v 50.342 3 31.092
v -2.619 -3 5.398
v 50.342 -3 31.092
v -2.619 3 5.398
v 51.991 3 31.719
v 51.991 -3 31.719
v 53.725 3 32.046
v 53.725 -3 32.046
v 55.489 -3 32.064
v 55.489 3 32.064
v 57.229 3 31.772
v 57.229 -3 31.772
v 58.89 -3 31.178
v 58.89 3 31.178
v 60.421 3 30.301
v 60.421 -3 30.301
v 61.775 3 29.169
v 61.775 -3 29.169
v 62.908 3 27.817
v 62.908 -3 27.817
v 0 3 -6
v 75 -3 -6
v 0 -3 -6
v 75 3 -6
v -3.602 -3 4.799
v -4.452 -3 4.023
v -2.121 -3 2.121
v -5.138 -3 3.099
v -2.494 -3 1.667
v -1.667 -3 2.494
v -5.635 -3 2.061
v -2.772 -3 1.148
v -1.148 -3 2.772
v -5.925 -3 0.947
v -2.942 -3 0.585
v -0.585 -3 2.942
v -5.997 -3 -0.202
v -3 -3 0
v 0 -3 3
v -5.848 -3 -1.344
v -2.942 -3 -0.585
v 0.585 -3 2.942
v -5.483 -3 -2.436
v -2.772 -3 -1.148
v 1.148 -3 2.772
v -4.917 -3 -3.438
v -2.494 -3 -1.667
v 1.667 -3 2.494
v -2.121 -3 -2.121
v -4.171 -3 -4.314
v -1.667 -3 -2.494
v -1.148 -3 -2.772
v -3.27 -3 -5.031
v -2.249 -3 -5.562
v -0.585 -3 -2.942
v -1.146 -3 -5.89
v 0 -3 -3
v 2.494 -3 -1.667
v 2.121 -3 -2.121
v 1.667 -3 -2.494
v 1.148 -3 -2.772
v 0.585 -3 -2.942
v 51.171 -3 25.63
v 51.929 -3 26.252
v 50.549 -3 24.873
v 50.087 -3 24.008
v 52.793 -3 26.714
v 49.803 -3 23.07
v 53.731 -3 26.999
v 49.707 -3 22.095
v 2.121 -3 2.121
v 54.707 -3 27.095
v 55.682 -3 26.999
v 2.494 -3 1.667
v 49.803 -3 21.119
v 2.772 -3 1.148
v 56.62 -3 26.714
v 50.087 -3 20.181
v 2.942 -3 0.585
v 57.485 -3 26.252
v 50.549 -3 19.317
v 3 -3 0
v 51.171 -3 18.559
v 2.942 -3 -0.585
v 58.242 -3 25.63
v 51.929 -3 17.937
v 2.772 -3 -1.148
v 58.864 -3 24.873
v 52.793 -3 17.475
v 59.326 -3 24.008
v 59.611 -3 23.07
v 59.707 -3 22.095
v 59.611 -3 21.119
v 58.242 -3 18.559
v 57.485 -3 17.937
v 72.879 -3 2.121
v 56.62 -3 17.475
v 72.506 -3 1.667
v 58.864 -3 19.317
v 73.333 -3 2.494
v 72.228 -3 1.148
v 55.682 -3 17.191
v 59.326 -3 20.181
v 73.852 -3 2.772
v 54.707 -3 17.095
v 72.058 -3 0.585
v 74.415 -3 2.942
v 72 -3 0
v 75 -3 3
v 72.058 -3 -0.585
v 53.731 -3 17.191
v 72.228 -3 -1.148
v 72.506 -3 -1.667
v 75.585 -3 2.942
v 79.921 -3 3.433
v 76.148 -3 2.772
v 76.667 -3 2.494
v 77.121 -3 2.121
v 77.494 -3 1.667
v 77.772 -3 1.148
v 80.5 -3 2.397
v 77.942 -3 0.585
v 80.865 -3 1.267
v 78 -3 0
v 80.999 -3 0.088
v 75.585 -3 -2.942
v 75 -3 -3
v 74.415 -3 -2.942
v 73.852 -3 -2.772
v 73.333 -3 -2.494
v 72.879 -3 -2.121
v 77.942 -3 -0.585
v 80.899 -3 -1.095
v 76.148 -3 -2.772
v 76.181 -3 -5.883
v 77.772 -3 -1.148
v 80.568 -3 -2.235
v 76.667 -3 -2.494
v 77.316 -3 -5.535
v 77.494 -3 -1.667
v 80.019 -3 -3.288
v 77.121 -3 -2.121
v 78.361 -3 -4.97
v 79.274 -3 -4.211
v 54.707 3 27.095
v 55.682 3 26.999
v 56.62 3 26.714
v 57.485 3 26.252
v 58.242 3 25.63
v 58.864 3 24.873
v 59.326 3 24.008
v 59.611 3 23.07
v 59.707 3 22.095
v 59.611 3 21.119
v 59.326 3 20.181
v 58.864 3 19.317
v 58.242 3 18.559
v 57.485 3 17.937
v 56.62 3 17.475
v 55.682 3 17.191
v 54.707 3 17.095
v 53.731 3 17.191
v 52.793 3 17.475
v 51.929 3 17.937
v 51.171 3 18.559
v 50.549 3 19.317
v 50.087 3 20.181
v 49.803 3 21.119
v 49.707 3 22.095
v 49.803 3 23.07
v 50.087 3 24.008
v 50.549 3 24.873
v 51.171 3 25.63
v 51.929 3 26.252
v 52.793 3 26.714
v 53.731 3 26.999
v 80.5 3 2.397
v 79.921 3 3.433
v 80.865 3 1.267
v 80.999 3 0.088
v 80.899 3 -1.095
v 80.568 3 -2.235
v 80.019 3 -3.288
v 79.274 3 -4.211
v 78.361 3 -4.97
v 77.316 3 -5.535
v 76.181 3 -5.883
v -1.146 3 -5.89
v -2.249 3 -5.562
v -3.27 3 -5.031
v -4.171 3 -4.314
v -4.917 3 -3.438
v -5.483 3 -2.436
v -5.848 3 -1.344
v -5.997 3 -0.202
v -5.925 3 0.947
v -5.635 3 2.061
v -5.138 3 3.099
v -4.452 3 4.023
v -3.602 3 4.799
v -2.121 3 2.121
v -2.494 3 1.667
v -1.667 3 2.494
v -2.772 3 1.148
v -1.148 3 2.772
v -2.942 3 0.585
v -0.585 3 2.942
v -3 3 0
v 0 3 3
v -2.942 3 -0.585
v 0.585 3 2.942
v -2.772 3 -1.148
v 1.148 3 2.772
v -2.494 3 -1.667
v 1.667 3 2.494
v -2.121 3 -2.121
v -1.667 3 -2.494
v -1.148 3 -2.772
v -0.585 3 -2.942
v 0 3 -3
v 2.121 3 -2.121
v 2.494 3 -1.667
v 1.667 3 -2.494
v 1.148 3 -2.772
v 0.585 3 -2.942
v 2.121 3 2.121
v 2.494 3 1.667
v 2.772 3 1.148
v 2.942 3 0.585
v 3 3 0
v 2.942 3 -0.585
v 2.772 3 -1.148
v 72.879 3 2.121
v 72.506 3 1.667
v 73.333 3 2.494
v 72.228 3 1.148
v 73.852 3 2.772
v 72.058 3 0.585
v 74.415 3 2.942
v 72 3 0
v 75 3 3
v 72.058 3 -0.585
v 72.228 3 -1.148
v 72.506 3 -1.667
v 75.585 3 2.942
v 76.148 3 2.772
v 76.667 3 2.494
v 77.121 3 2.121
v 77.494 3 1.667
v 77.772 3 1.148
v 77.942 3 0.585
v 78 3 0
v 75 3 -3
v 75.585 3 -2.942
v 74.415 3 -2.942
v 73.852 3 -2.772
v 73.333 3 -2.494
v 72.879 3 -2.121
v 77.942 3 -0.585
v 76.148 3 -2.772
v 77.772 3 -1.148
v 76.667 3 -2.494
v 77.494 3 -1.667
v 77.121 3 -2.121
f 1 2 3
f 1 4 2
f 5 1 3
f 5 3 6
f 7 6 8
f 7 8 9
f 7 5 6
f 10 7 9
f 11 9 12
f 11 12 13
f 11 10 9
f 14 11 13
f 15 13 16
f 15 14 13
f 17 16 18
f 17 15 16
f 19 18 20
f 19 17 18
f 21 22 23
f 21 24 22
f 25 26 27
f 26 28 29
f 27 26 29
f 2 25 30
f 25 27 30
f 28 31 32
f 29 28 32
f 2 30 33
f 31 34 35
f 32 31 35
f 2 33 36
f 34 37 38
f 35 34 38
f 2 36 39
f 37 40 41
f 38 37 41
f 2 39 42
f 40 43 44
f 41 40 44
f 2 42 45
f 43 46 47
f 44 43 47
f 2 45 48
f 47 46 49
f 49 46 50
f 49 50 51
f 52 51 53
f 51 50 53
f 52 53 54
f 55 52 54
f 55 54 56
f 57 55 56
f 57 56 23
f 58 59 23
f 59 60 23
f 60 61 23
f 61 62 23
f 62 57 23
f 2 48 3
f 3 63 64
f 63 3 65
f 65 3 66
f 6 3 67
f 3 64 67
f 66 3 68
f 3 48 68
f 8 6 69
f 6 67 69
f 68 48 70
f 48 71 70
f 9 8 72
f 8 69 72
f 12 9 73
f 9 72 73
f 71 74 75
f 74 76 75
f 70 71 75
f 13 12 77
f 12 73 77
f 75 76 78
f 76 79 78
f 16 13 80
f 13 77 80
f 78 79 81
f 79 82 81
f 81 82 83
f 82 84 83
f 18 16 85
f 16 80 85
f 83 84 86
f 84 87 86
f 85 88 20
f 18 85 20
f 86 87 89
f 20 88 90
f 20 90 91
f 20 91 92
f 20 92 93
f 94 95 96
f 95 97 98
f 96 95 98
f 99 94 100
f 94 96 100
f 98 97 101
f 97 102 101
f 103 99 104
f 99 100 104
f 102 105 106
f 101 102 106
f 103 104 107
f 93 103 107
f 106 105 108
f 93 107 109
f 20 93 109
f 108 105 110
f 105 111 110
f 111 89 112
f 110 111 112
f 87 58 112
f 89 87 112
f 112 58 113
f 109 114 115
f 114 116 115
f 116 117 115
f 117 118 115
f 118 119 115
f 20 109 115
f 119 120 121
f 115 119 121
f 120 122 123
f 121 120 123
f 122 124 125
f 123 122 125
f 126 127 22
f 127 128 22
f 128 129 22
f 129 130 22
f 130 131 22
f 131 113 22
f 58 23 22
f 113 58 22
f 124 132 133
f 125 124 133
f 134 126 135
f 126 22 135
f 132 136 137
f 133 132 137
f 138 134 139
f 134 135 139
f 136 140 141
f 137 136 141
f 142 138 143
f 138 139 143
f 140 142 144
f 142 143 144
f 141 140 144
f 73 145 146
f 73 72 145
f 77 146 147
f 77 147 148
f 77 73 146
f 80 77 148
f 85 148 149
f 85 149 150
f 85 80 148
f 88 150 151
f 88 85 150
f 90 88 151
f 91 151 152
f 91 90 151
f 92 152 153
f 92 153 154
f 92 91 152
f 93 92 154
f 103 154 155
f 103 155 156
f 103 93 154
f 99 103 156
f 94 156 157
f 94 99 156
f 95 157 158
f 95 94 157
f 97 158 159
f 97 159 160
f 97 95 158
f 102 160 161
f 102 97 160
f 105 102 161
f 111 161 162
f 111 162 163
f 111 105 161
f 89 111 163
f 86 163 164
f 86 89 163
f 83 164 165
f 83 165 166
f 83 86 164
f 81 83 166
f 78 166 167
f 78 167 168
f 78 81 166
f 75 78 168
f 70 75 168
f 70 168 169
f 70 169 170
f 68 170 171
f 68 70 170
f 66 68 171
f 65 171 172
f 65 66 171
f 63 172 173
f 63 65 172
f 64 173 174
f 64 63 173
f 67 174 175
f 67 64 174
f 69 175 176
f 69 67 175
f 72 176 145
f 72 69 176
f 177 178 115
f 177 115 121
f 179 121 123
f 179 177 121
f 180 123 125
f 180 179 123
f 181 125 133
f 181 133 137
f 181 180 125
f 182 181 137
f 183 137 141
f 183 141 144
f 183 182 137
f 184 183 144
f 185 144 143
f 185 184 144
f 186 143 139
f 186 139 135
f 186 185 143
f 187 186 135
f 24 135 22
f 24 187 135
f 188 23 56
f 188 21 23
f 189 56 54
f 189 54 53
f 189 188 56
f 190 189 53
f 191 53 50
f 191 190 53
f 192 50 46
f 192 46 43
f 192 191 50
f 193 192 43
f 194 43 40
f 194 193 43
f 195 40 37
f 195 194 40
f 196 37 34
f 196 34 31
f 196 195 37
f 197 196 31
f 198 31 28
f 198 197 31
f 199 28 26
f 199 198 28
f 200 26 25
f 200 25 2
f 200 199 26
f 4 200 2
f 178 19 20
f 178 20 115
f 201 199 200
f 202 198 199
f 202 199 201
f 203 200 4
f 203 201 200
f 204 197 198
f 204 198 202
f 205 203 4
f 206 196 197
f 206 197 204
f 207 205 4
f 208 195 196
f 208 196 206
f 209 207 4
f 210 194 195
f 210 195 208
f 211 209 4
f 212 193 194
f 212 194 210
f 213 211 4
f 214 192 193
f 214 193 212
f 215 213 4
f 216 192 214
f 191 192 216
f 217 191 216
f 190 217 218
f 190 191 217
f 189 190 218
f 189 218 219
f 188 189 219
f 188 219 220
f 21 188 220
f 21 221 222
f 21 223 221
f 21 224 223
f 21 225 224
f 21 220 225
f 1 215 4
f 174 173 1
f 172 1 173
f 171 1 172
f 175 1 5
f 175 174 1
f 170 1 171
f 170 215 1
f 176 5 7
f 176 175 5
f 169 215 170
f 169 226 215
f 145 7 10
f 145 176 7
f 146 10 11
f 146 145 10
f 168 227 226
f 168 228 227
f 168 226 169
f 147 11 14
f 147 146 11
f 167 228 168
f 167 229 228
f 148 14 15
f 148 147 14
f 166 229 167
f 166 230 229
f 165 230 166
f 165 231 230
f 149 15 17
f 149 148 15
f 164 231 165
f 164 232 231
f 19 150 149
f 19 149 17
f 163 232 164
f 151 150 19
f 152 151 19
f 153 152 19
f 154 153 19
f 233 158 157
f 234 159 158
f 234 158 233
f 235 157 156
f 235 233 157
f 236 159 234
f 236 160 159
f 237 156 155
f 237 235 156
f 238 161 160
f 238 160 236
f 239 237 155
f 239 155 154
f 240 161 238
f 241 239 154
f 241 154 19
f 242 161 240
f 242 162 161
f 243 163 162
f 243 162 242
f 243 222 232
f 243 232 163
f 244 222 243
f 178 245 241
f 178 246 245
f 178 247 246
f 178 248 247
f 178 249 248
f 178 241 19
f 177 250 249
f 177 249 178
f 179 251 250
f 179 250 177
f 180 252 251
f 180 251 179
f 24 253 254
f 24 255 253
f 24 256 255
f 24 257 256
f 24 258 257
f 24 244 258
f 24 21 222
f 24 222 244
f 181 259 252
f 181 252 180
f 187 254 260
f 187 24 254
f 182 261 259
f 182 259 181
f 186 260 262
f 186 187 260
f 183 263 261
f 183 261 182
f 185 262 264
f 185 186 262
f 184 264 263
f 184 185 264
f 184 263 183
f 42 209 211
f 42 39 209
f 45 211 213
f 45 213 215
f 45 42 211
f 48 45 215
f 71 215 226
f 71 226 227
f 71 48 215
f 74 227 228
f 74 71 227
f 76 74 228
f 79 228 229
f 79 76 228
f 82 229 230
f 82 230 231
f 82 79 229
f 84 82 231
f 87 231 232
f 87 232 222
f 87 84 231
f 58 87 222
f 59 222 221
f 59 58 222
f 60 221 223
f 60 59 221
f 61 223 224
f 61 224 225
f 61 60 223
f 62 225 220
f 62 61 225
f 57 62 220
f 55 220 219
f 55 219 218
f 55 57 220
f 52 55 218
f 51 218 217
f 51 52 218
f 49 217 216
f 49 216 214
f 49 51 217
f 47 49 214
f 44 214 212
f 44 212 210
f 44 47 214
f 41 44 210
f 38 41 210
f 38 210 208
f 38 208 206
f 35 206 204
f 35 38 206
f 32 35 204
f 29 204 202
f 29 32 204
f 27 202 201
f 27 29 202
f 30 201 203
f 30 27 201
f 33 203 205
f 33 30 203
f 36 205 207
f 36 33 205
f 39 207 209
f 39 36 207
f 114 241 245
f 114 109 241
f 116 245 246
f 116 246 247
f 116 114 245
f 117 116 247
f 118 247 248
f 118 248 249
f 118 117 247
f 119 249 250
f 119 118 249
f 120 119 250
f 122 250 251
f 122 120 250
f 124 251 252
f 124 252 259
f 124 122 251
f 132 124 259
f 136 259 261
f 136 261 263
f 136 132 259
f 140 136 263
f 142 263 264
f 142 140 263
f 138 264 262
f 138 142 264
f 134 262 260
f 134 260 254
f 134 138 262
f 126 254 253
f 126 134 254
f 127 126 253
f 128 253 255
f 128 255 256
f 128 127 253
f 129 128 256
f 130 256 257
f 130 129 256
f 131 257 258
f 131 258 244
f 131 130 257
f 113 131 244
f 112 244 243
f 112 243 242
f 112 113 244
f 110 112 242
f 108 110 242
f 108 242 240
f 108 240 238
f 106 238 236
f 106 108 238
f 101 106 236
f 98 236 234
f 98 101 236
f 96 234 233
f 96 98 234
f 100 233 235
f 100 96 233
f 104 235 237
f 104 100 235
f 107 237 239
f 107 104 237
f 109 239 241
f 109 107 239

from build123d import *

# Parameters (mm, degrees)
SKETCH_1_R      = 5
SKETCH_1_R_2    = 3
EXTRUDE_1_DEPTH = 3


with BuildPart() as part:
    # 草图1 → 凸台-拉伸1 (new, symmetric)
    with BuildSketch(Plane(origin=(0, 0, 0), x_dir=(1, 0, 0), z_dir=(0, 1, 0))):
        with BuildLine():
            Line((-2.618938967, -5.398255152), (50.341768388, -31.091901768))
            ThreePointArc((50.341768388, -31.091901768), (57.228686361, -31.77155603), (62.907769529, -27.816864709))
            Line((62.907769529, -27.816864709), (79.920661718, -3.433232917))
            ThreePointArc((79.920661718, -3.433232917), (80.319746117, 2.774941666), (75, 6))
            Line((75, 6), (0, 6))
            ThreePointArc((0, 6), (-5.847629046, 1.34359017), (-2.618938967, -5.398255152))
        make_face()
        with Locations(Location((54.706666667, -22.094809848, 0), (0, 0, 270))):
            Circle(SKETCH_1_R, mode=Mode.SUBTRACT)
        with Locations(Location((75, 0, 0), (0, 0, 270))):
            Circle(SKETCH_1_R_2, mode=Mode.SUBTRACT)
        with Locations(Location((0, 0, 0), (0, 0, 270))):
            Circle(SKETCH_1_R_2, mode=Mode.SUBTRACT)
    extrude(amount=EXTRUDE_1_DEPTH, both=True)


solid = part.part
